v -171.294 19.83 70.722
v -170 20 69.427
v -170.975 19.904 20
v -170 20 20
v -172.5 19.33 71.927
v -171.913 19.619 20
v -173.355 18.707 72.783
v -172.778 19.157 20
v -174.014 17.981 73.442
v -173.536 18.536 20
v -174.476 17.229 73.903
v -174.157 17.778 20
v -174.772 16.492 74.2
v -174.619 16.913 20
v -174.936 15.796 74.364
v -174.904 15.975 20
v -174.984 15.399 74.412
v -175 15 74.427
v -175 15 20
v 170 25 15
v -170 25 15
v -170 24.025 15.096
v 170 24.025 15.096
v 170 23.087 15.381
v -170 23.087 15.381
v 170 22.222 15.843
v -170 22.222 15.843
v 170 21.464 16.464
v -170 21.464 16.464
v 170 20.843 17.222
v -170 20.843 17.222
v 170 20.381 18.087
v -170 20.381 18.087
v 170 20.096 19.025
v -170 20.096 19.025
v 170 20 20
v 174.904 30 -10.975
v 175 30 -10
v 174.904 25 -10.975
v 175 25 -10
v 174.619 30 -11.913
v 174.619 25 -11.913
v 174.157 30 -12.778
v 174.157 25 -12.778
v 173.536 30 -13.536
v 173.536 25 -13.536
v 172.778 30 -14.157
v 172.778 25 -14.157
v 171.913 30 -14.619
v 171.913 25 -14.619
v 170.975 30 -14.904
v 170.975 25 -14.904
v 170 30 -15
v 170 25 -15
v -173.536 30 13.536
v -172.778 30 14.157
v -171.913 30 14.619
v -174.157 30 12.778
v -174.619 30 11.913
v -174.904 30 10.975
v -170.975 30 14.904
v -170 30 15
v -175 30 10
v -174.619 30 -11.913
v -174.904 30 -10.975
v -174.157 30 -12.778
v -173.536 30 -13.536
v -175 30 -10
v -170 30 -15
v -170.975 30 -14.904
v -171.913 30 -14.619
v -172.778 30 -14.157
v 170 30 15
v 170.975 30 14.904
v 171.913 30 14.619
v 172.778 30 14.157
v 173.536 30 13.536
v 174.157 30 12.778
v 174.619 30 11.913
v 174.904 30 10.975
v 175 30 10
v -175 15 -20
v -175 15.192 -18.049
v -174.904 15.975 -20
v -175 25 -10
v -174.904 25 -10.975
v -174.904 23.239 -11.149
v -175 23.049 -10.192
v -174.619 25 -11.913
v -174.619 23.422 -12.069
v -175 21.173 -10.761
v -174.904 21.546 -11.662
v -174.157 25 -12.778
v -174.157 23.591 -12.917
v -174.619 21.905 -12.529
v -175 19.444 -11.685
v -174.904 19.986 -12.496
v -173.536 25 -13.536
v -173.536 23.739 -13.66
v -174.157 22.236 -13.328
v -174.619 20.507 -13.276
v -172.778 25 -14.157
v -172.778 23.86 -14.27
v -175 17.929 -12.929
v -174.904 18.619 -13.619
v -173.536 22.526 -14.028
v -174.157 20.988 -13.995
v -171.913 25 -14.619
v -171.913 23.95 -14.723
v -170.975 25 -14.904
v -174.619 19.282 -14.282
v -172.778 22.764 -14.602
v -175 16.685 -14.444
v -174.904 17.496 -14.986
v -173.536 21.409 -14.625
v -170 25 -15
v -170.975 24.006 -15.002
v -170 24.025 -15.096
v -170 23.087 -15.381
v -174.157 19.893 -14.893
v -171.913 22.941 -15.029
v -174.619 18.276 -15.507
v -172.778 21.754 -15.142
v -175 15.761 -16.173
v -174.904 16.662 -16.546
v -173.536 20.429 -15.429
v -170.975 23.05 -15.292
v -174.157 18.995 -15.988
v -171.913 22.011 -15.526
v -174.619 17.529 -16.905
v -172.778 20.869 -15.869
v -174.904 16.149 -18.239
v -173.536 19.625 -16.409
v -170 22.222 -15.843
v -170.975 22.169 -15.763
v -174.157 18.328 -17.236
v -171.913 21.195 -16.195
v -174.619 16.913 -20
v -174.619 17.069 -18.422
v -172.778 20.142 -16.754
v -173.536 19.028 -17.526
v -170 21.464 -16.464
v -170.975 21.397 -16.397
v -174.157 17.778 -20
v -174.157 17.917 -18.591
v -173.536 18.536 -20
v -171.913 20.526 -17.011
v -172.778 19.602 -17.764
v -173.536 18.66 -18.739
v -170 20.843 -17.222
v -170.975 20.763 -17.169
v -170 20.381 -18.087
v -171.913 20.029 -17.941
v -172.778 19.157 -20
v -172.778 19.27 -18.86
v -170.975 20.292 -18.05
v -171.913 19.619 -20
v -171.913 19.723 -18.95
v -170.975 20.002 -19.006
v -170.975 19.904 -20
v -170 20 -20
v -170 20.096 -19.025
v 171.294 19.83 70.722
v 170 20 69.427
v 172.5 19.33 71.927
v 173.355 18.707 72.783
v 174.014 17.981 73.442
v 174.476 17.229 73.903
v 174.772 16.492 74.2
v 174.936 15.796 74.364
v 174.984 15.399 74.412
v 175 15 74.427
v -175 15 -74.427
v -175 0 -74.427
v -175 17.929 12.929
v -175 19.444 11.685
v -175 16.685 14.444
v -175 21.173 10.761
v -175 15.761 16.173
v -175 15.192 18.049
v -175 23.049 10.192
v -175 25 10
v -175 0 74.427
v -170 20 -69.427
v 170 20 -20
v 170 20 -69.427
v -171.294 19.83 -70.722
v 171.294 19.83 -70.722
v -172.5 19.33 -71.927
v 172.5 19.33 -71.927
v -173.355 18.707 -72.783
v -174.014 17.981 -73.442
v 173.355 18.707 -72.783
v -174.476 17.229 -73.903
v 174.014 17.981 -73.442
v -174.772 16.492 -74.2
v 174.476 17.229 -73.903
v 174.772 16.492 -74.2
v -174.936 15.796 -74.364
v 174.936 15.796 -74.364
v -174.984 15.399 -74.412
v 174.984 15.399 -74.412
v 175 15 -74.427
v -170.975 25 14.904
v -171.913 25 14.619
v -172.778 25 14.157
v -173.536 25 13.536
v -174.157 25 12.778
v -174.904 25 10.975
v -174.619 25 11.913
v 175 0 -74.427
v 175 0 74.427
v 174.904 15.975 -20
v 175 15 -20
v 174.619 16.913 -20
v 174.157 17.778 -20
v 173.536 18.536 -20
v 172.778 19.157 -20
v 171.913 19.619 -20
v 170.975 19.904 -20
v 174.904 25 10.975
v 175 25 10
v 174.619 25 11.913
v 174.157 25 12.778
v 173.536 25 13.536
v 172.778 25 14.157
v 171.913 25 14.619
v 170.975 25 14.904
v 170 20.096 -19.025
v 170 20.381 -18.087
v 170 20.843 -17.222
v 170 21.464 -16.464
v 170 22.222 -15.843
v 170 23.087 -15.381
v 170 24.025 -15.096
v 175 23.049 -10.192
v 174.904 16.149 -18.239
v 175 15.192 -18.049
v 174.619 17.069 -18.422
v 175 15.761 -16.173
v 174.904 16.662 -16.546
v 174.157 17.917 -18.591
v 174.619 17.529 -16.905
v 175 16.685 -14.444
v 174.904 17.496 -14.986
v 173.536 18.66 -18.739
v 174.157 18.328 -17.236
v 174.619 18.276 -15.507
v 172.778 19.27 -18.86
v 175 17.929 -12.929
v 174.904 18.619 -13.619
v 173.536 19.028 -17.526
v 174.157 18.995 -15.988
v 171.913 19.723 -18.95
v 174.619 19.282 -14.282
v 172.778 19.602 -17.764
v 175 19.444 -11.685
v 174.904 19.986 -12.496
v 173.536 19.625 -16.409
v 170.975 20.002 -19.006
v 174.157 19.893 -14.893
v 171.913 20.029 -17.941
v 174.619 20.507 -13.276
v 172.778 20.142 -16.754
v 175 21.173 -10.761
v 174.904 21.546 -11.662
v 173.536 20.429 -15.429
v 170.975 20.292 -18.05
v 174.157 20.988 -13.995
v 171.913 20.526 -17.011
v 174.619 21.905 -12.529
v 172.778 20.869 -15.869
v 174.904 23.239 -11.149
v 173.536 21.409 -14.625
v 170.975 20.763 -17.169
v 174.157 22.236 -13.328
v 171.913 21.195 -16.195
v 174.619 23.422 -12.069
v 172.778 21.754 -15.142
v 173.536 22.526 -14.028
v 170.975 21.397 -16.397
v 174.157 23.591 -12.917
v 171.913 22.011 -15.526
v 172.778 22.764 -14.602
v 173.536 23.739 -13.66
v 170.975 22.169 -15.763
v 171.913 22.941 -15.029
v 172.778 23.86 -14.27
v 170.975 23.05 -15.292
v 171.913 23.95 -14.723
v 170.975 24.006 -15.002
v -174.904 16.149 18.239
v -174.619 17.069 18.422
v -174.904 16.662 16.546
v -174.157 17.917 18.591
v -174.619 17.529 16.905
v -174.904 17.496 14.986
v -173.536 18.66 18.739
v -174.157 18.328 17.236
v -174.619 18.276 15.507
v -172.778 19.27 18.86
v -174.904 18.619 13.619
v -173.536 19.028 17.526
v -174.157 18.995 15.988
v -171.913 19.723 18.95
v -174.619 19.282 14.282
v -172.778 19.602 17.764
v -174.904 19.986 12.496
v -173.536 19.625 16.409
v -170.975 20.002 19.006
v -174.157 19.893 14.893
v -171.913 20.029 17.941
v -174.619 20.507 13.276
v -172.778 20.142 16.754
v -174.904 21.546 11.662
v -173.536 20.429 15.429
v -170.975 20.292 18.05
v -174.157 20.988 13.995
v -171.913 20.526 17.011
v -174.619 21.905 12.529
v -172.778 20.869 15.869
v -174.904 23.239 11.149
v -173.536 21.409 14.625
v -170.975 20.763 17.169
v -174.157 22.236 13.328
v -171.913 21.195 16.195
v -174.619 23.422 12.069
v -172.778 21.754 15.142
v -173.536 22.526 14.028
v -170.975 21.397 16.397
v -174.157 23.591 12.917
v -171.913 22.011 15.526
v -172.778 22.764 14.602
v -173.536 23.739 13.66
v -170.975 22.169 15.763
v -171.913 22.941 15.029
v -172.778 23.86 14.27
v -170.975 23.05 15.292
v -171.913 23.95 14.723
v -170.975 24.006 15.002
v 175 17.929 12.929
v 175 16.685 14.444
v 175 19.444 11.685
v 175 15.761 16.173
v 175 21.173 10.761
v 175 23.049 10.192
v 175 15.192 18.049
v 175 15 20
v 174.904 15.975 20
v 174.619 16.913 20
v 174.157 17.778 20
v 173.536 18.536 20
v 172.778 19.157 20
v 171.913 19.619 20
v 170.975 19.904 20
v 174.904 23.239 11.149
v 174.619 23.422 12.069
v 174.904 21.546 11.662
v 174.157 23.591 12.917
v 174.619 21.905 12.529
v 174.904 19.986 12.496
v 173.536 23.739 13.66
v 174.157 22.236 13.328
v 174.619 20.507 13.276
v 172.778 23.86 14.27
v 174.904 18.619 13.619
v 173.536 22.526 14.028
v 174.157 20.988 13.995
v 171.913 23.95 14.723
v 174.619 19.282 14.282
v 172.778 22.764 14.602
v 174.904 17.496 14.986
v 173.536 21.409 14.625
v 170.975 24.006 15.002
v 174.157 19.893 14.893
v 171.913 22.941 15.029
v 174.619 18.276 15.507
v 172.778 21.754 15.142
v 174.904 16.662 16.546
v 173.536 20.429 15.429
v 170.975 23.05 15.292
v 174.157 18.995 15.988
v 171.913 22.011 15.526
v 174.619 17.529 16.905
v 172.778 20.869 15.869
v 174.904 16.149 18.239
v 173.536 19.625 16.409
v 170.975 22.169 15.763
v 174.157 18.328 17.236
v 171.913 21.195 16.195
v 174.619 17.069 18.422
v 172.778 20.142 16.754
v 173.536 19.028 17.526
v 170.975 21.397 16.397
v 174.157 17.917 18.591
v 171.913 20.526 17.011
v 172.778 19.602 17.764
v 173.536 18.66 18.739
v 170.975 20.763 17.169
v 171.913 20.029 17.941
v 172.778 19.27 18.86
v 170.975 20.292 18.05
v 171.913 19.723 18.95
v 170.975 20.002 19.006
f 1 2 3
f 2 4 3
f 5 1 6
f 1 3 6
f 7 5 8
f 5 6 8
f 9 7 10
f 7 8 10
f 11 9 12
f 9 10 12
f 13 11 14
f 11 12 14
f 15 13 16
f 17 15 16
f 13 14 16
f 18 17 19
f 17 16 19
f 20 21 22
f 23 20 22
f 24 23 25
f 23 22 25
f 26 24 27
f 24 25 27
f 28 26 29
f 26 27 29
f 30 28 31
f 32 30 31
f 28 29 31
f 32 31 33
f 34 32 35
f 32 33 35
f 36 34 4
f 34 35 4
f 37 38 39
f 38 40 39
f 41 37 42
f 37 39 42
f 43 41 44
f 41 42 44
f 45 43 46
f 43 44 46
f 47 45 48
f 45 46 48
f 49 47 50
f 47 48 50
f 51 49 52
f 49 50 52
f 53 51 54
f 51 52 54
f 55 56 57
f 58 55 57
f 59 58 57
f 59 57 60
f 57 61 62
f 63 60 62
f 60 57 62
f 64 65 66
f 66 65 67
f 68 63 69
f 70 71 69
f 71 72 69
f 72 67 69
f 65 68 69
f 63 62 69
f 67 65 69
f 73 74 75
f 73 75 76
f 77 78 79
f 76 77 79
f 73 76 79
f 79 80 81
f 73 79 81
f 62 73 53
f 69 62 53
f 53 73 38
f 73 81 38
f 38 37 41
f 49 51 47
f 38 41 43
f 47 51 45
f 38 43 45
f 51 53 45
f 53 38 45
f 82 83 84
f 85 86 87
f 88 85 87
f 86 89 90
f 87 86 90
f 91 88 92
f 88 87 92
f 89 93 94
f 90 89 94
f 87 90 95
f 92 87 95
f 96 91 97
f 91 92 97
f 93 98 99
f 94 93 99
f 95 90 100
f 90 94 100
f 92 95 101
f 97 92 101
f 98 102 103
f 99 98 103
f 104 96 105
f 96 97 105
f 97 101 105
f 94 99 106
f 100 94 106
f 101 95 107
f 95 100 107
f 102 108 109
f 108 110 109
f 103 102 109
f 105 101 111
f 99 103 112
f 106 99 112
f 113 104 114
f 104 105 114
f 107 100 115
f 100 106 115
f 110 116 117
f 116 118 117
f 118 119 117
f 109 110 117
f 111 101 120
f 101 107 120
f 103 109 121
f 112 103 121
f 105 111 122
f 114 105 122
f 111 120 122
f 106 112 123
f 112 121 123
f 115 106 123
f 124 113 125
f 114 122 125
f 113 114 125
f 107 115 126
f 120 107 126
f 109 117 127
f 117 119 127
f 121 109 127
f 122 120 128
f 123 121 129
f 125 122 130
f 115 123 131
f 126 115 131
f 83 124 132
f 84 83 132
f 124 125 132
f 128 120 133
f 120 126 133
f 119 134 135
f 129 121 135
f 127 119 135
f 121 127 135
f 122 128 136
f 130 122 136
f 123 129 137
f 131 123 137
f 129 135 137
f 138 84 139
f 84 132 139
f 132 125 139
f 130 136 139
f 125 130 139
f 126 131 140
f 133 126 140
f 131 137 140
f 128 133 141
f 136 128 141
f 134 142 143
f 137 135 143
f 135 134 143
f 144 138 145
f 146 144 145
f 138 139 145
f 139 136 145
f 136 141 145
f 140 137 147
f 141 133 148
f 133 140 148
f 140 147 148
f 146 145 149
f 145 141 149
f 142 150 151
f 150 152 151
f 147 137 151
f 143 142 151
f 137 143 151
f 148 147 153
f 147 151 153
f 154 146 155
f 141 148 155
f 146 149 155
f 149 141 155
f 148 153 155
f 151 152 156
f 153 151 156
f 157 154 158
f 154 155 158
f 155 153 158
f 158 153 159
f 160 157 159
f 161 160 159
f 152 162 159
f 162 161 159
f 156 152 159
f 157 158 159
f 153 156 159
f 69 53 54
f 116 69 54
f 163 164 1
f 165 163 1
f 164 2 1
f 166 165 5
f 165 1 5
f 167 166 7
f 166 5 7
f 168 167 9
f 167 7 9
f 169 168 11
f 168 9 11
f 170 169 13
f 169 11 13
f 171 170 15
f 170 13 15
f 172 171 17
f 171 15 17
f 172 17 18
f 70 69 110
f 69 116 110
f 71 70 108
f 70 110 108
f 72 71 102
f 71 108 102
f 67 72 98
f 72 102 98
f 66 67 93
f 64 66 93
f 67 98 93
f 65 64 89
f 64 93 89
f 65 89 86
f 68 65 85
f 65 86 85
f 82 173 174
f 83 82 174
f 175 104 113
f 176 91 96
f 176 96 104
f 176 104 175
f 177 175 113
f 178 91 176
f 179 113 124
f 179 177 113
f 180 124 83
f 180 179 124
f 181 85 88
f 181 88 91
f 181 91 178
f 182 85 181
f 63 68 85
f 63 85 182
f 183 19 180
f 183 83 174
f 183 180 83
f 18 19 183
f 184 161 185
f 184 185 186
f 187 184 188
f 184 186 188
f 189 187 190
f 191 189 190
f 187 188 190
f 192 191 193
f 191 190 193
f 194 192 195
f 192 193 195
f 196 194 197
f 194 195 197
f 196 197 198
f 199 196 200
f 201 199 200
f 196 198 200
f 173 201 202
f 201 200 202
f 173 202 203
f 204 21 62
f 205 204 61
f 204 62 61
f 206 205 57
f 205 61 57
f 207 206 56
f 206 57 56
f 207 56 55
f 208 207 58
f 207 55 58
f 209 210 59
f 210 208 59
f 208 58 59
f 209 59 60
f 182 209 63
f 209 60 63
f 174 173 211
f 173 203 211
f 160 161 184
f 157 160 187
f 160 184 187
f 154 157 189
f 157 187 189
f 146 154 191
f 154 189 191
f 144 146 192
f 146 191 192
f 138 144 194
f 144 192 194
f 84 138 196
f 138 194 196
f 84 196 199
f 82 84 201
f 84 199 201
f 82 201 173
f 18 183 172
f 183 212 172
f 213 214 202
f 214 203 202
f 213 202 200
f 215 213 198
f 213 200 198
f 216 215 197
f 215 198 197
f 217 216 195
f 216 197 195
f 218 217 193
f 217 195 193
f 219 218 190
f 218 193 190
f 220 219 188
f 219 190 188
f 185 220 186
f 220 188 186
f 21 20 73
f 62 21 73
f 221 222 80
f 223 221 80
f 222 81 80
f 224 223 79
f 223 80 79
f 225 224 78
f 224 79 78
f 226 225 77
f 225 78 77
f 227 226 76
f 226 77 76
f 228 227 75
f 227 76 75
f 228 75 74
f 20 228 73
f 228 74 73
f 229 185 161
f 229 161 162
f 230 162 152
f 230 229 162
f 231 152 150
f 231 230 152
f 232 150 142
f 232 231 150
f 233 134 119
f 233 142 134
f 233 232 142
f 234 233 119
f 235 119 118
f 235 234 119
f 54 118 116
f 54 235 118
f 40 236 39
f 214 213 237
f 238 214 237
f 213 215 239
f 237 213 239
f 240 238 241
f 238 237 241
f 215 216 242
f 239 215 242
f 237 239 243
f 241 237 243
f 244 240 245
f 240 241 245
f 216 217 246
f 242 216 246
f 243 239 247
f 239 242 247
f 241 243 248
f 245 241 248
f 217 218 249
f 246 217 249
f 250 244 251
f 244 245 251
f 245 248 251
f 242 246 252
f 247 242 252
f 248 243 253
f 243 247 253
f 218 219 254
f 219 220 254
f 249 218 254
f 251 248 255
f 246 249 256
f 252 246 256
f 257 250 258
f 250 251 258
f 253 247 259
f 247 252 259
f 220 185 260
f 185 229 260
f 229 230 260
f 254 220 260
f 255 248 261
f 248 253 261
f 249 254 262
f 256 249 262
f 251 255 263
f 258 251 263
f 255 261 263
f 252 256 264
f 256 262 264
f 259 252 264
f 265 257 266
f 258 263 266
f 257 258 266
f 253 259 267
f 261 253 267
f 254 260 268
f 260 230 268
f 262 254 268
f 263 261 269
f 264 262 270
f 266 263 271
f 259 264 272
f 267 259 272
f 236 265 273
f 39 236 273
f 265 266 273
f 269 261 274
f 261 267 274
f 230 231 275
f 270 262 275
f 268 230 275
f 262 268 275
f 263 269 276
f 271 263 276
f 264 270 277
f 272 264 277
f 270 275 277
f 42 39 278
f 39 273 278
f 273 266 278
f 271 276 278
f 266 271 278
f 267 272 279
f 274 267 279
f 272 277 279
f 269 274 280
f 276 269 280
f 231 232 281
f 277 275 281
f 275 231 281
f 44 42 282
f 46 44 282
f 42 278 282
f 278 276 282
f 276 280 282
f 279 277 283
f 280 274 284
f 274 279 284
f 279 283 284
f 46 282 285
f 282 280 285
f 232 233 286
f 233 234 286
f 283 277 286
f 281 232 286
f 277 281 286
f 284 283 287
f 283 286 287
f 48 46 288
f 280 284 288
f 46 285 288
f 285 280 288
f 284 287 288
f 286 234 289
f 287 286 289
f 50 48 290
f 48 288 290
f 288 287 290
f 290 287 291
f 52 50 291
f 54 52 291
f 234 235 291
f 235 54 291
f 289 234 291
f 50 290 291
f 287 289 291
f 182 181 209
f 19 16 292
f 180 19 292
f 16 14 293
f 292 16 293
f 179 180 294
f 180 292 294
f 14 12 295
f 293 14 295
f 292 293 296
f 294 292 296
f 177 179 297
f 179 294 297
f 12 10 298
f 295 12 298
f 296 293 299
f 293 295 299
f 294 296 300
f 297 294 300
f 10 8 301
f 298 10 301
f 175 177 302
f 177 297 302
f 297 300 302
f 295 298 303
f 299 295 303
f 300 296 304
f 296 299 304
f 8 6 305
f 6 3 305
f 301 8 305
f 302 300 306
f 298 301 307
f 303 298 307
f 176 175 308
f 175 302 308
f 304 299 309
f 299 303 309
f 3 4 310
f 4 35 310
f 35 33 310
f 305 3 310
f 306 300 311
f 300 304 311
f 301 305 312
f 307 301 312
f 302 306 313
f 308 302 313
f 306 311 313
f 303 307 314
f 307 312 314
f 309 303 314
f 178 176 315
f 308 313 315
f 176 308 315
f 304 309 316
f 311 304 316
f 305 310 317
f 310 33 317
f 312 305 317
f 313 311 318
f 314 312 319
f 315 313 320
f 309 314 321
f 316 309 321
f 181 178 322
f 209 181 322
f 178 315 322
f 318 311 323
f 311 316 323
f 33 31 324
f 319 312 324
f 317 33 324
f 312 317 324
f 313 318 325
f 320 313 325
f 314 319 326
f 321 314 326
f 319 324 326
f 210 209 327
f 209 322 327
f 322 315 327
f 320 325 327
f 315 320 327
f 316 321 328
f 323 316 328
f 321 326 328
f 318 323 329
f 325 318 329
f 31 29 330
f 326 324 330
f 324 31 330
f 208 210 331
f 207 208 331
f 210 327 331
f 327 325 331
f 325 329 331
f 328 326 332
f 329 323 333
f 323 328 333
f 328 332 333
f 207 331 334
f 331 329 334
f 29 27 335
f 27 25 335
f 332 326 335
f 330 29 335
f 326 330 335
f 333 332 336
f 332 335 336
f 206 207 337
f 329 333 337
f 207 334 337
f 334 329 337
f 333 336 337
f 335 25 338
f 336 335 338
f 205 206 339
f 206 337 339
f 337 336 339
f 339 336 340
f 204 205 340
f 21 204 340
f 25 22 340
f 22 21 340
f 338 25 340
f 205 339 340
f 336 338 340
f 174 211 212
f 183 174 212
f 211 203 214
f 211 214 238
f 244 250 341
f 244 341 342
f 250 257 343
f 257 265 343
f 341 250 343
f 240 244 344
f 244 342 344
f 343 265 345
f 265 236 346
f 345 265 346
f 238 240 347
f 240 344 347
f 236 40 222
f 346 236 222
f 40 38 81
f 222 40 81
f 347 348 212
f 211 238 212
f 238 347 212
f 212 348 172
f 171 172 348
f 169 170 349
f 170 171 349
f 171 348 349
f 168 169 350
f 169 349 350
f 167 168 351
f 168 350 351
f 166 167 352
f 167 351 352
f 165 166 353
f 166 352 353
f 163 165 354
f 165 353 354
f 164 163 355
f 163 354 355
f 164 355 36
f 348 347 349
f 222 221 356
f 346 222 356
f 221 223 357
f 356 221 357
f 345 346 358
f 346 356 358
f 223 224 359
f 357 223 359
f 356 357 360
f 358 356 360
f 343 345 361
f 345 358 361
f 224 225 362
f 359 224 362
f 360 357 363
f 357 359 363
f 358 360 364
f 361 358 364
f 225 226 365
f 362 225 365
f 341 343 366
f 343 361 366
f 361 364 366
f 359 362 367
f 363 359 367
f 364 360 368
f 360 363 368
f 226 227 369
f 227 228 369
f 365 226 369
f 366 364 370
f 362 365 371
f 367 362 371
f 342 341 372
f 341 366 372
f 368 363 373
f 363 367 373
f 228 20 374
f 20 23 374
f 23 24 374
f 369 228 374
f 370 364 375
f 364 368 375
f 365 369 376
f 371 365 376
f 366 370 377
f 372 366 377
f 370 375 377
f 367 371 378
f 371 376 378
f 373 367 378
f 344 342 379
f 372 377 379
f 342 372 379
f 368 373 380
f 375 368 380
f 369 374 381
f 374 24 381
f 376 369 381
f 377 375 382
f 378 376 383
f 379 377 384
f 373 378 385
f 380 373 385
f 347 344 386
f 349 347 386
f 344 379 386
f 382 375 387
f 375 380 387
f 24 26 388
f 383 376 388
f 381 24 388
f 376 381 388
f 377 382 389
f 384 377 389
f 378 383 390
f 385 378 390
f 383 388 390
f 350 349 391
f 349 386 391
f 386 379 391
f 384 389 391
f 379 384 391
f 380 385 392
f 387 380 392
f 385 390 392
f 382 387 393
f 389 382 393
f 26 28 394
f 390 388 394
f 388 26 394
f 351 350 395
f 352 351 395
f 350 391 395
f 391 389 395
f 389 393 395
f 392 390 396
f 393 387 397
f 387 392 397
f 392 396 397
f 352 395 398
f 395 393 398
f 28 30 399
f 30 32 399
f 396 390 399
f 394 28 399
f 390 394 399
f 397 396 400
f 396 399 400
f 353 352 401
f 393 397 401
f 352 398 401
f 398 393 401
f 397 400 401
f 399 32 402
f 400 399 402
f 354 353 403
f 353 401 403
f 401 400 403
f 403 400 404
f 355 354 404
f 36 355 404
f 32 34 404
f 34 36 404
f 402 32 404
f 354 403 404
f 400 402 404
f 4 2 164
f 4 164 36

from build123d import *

# Parameters (mm, degrees)
SALIENTE_EXTRUIR1_DEPTH = 175
REDONDEO1_R             = 5


with BuildPart() as part:
    # Croquis1 → Saliente-Extruir1 (new, symmetric)
    with BuildSketch(Plane(origin=(0, 0, 0), x_dir=(0, 0, -1), z_dir=(1, 0, 0))):
        Polygon((74.427480916, 0), (-74.427480916, 0), (-74.427480916, 20), (-15, 20), (-15, 30), (15, 30), (15, 20), (74.427480916, 20), align=None)
    extrude(amount=SALIENTE_EXTRUIR1_DEPTH, both=True)

    # Redondeo1
    redondeo1_edges = [part.edges().sort_by_distance(p)[0] for p in [
        (-175, 25, -15),
        (-175, 20, -44.713740458),
        (175, 25, -15),
        (0, 20, 74.427480916),
        (0, 20, 15),
        (0, 20, -15),
        (0, 20, -74.427480916),
        (175, 25, 15),
        (175, 20, 44.713740458),
        (175, 20, -44.713740458),
        (-175, 20, 44.713740458),
        (-175, 25, 15),
    ]]
    fillet(redondeo1_edges, radius=REDONDEO1_R)


solid = part.part
